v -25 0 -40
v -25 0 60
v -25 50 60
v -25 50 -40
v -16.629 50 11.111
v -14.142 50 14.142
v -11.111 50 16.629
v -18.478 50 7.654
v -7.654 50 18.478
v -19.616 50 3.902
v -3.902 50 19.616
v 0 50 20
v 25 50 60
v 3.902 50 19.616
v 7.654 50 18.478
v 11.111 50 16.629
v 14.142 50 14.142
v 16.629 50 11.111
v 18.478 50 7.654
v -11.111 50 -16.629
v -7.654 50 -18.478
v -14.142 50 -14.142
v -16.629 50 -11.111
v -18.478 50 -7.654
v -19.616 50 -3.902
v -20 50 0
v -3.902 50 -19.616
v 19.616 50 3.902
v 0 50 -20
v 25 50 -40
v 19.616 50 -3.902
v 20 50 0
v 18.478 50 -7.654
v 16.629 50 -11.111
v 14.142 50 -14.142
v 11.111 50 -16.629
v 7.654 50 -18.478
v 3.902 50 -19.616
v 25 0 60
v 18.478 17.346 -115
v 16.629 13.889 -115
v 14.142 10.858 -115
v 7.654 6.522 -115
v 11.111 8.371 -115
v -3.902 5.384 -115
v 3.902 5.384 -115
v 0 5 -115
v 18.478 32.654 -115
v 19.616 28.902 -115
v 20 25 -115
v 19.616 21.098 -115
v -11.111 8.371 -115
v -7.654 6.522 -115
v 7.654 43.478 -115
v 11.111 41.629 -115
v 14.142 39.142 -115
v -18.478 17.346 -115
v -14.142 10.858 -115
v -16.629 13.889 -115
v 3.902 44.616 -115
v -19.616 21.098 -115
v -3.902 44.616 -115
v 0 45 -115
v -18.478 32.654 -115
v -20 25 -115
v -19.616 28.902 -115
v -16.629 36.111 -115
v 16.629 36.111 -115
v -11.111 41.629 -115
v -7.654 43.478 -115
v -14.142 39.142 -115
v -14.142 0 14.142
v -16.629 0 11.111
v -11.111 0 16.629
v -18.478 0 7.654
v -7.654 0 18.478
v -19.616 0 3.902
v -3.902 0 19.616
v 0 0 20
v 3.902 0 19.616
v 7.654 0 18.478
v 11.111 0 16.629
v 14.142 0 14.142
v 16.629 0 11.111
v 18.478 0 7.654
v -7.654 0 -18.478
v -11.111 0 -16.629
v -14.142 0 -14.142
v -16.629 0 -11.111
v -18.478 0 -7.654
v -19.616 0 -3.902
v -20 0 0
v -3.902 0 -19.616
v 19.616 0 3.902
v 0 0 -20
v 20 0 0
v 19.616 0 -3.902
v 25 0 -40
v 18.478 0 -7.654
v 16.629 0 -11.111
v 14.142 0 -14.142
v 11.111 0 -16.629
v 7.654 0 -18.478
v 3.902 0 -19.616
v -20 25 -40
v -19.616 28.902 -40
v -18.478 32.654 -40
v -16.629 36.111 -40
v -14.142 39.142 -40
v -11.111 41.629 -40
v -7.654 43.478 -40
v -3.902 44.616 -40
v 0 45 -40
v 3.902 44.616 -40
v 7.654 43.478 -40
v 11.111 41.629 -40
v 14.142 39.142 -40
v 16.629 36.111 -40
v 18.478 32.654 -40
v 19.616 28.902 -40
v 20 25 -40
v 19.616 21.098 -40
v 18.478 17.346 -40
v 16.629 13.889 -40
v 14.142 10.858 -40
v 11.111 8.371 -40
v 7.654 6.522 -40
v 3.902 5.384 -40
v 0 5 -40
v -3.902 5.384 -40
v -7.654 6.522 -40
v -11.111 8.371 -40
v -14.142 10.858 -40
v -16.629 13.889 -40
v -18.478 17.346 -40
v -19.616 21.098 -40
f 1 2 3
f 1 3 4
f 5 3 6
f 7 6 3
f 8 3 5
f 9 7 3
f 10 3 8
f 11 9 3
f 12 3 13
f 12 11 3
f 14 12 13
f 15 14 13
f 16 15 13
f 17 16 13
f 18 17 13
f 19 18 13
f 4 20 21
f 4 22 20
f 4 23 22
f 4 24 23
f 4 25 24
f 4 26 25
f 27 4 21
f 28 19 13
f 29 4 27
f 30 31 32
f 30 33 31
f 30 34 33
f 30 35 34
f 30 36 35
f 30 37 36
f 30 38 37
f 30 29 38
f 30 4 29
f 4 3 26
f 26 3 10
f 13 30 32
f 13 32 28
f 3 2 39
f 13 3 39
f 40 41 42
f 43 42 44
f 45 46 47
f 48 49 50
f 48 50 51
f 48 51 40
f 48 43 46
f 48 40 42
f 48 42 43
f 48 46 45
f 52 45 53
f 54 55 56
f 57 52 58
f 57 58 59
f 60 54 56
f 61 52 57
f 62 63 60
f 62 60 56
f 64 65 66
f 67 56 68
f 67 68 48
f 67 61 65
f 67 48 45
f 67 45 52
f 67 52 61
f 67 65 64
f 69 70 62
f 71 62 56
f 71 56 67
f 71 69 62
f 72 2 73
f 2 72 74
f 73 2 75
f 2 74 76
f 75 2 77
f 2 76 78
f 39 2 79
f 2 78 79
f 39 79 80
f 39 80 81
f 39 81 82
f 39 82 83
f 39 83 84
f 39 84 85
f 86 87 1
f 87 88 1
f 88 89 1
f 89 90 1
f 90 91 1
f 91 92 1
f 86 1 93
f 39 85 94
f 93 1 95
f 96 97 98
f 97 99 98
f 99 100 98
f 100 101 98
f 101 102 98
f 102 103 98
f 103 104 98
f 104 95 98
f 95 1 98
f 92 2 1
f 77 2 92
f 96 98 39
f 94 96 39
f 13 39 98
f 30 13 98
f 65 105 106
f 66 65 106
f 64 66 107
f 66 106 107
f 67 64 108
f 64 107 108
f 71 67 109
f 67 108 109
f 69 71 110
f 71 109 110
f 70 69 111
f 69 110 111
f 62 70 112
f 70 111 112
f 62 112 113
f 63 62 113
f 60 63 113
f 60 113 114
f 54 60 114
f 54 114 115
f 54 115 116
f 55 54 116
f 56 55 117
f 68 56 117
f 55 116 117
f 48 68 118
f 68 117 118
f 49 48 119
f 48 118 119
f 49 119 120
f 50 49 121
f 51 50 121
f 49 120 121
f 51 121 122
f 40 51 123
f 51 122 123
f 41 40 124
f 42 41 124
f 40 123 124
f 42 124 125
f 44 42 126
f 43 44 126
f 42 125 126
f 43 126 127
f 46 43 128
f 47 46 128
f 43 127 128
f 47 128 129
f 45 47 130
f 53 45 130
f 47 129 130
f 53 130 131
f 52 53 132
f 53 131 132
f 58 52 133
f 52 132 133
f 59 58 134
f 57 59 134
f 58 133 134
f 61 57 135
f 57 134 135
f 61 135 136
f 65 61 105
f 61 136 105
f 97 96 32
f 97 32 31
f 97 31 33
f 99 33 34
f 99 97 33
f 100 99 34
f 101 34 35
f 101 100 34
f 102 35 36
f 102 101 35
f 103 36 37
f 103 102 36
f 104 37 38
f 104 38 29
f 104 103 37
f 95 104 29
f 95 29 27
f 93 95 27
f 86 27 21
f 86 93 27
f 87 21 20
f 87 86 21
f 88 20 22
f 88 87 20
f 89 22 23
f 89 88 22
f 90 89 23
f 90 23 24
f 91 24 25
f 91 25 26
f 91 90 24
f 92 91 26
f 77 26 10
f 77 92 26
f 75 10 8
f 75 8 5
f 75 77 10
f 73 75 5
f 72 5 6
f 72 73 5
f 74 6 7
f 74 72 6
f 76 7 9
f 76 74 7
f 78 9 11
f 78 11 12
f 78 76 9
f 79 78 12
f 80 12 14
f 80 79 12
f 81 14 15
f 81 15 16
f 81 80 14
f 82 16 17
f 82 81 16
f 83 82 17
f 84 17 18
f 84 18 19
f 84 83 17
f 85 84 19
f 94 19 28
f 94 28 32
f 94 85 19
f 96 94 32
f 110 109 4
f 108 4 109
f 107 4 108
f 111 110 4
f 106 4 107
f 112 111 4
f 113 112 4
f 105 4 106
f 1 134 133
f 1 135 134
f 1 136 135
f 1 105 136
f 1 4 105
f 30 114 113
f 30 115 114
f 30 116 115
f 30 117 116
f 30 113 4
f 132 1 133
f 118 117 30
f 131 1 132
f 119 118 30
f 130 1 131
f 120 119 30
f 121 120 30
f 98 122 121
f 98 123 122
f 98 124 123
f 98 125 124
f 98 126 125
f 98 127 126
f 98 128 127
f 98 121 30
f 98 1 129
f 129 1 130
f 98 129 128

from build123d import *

# Parameters (mm, degrees)
CROQUIS1_W              = 50
CROQUIS1_H              = 100
CROQUIS1_R              = 20
SALIENTE_EXTRUIR1_DEPTH = 50
CROQUIS2_R              = 20
SALIENTE_EXTRUIR2_DEPTH = 75


with BuildPart() as part:
    # Croquis1 → Saliente-Extruir1 (new body)
    with BuildSketch(Plane(origin=(0, 0, 0), x_dir=(1, 0, 0), z_dir=(0, 1, 0))):
        with Locations((0, -10)):
            Rectangle(CROQUIS1_W, CROQUIS1_H)
        Circle(CROQUIS1_R, mode=Mode.SUBTRACT)
    extrude(amount=SALIENTE_EXTRUIR1_DEPTH)

    # Croquis2 → Saliente-Extruir2 (add)
    with BuildSketch(Plane(origin=(0, 0, -40), x_dir=(-1, 0, 0), z_dir=(0, 0, -1))):
        with Locations((0, 25)):
            Circle(CROQUIS2_R)
    extrude(amount=SALIENTE_EXTRUIR2_DEPTH)


solid = part.part
